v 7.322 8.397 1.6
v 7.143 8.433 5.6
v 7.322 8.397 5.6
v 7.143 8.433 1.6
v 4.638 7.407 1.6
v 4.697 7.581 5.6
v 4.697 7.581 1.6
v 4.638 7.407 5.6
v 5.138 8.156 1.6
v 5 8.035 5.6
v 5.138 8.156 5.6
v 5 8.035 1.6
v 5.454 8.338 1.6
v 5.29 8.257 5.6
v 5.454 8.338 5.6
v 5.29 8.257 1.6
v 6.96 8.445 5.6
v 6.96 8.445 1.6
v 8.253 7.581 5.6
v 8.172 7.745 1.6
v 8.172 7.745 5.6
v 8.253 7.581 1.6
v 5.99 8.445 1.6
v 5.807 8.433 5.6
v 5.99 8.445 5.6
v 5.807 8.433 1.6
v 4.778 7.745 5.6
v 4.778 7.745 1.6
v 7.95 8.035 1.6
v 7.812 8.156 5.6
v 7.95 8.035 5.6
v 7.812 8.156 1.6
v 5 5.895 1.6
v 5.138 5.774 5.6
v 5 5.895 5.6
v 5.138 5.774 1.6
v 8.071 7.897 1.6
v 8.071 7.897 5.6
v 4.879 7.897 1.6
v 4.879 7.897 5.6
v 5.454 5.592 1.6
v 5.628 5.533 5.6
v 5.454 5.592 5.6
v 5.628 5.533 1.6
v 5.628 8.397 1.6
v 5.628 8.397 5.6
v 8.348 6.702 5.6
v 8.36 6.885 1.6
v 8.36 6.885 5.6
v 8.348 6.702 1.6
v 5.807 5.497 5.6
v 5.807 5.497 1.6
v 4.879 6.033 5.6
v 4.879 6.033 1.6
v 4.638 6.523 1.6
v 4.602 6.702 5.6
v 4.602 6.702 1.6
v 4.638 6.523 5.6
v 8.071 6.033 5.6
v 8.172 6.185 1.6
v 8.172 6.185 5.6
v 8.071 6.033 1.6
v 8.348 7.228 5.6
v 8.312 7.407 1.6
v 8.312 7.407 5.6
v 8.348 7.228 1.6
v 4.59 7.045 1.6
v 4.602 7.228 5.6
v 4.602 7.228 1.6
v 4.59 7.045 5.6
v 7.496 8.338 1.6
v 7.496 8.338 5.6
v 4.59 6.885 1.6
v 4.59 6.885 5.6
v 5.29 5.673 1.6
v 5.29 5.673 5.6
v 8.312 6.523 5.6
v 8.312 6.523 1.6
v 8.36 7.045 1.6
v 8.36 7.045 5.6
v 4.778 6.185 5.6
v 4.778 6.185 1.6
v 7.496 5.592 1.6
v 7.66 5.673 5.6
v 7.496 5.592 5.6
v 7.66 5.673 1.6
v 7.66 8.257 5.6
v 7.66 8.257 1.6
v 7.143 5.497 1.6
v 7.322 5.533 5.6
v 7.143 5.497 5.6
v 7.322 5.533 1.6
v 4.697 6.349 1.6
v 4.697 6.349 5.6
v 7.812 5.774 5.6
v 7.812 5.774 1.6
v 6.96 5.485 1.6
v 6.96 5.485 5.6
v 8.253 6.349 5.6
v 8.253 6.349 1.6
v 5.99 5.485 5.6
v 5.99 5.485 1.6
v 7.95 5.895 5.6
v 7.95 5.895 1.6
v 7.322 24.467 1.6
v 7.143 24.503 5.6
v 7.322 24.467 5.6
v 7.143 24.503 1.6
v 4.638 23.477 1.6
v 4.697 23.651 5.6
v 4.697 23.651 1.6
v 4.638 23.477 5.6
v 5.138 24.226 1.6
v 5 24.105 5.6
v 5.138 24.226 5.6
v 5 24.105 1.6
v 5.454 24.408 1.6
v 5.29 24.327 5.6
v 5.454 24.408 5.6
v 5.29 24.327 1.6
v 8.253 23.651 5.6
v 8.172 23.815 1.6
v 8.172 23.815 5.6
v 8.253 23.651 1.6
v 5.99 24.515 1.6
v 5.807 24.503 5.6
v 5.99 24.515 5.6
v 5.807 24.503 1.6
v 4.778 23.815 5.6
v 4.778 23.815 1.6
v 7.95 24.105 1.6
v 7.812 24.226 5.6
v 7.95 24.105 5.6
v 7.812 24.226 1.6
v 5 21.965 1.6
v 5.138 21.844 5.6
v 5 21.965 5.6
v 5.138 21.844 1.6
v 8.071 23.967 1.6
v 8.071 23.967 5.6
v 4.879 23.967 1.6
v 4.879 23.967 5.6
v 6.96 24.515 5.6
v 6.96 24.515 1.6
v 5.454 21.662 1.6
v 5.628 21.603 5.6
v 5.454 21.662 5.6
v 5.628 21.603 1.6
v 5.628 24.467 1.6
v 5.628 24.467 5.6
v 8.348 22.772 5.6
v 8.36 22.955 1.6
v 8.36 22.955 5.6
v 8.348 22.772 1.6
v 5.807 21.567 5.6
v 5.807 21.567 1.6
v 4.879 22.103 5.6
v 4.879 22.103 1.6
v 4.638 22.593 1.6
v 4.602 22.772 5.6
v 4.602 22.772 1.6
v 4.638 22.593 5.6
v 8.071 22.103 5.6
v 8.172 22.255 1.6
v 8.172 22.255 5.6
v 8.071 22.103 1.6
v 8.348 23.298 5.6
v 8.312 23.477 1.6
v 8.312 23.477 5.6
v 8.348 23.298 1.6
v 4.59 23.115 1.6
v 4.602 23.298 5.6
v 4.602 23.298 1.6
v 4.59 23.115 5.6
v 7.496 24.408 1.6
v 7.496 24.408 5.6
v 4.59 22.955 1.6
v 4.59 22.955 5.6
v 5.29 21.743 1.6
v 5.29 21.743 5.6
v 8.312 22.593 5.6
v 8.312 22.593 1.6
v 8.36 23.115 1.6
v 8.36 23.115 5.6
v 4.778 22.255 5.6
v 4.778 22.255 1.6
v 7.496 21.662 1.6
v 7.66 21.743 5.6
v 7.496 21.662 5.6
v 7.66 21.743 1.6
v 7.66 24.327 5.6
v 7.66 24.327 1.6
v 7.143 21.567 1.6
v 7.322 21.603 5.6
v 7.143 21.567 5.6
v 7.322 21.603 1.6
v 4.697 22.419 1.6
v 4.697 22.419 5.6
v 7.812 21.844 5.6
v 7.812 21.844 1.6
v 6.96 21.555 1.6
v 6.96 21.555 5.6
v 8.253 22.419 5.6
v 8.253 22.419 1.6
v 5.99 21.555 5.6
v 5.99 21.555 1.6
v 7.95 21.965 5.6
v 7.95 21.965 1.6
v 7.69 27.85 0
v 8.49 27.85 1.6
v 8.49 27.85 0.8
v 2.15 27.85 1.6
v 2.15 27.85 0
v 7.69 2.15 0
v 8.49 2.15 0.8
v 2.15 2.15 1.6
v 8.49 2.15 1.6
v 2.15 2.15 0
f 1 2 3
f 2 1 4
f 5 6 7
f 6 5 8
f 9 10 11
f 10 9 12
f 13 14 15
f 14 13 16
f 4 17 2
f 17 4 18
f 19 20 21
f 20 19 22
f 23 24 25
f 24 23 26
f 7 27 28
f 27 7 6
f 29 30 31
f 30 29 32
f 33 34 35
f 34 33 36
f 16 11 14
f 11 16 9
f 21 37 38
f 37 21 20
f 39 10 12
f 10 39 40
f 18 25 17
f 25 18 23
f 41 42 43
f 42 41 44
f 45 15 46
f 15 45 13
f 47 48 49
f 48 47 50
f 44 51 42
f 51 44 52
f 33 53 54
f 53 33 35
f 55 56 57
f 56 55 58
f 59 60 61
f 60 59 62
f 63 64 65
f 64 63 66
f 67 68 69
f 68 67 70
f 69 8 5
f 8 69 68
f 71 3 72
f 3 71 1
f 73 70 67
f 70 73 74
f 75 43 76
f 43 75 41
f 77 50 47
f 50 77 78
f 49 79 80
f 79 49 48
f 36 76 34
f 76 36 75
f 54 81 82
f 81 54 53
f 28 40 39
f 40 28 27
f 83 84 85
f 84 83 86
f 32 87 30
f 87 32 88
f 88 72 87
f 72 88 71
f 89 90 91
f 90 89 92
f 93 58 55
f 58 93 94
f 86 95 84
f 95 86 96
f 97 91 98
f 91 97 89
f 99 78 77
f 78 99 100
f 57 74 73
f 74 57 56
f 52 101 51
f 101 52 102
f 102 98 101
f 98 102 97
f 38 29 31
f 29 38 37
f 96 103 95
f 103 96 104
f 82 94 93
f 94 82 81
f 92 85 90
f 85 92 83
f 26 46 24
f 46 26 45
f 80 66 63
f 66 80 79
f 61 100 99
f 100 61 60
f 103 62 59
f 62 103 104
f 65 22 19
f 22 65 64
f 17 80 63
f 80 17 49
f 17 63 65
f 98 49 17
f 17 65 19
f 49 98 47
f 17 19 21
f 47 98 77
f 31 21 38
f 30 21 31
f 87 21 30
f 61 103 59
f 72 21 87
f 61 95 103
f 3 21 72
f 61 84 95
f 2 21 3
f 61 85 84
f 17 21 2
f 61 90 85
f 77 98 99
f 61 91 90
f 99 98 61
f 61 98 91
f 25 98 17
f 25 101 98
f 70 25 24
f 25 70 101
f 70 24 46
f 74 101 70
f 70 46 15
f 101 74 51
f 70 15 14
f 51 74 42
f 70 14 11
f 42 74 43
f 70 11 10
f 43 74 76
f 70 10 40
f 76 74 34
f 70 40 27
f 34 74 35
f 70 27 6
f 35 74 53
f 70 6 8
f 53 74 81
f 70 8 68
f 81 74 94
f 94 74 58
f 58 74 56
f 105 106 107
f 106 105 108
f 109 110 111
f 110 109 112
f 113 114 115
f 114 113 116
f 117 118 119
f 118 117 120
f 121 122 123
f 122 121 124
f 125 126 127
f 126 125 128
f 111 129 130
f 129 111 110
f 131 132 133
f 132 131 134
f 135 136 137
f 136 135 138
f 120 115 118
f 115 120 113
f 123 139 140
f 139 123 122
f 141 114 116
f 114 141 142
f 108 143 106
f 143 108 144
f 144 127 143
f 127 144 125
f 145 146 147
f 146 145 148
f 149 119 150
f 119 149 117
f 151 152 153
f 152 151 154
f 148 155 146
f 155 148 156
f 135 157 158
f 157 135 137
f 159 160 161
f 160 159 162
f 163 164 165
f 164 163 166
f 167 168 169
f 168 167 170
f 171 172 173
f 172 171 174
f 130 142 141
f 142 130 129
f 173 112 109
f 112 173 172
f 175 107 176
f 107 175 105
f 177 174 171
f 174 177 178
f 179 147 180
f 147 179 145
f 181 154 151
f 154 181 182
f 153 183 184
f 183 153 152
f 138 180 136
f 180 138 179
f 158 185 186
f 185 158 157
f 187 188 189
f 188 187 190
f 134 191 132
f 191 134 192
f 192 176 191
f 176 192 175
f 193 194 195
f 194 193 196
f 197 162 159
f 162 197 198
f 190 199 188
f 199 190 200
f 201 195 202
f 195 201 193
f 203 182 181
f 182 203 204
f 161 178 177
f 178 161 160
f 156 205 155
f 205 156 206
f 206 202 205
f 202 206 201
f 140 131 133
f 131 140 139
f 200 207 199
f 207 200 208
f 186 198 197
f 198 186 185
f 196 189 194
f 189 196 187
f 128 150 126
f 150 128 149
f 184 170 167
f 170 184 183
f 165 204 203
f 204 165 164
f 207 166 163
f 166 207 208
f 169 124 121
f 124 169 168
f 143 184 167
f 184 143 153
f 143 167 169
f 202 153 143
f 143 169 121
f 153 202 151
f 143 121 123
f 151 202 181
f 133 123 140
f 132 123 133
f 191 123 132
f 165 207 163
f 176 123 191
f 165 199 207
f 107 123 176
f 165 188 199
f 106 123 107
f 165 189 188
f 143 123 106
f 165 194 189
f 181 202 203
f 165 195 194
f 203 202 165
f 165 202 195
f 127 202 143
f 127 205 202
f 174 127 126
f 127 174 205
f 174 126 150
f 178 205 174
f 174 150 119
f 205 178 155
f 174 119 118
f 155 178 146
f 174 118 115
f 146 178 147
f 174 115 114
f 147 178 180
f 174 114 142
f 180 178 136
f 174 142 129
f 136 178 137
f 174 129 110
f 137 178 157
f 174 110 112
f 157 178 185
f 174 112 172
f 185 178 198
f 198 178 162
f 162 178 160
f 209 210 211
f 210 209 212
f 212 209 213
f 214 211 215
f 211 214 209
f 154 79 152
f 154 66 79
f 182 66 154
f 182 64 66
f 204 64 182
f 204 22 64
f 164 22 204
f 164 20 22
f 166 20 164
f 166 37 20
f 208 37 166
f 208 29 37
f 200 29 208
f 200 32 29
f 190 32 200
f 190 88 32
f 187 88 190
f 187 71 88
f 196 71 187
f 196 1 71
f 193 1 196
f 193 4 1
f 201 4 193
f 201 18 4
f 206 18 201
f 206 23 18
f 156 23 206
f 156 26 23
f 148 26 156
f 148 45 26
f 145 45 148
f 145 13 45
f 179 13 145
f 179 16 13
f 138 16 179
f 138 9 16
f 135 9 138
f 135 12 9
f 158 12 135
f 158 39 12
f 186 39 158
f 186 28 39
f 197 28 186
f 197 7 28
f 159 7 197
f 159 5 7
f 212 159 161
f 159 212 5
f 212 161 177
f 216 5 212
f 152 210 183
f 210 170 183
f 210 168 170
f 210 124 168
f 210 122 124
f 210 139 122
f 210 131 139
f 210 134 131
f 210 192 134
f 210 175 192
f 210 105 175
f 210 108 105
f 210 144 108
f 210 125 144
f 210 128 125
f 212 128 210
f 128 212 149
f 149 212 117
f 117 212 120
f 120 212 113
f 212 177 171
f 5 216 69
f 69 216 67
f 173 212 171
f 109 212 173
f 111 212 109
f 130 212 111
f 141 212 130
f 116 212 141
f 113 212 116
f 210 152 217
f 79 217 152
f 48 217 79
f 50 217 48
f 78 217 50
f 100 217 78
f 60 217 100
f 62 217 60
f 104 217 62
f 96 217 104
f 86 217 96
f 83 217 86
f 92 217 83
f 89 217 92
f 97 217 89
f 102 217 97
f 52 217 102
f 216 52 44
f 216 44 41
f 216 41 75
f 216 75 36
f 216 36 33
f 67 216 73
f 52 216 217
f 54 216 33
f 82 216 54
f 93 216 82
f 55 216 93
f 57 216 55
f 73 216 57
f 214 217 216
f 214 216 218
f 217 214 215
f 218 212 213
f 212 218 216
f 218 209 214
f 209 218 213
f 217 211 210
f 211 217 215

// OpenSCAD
// buttons.scad - flex insert for the two front buttons, built step by step (same coordinates as build.scad)
// & "C:\Program Files\OpenSCAD\openscad.exe" -o ..\lilygo_buttons_test5.stl buttons.scad
$fn = 48;

// STEP 1: settings, copied from build.scad so the insert lines up with the shell
fit = 0.20;  rw = 2.0;  plug_over = 0.54;
pcb_w = 25.51;  blk_w = 25.6;  in_w = blk_w + 2*fit;   // inside width of the shell (26.0)
blk_y0 = (pcb_w - blk_w) / 2;
plate = 1.2;  blk_h = 6.44;  pcb_top = plate + blk_h + 0.1;   // z of the board's top surface
bx = rw + plug_over + fit;                       // shell x of the board's USB-C edge
by = rw + fit - blk_y0;                          // shell y of the board's edge
blk_x0 = 6.00;
step_x1 = blk_x0 - fit;  step_extra = 1.1;  step_wall = 1.0;  wall_cham = 0.8;
step_under = 3.5;  step_plate = 1.6;
wall_top = pcb_top - step_under;                 // top of the roof (4.24)
roof_bot = wall_top - step_plate;                // underside of the roof (2.64), the recess is open below this
recess_x1 = bx + step_x1 + step_extra - step_wall;   // where the recess ends at the drop-down wall's face
btn_x0 = 1.65;  btn_x1 = 5.82;                   // button x range on the board
btn_y0 = 3.04;  btn_y1 = 6.40;                   // button y range, from the board edge

// the insert's own settings
ins_gap = 0.15;                                  // free space between the insert and the recess walls, each side
top_gap = 0.10;                                  // free space between the insert's top and the roof underside
btn_top = 5.7;                                   // MEASURED: button top, up from the outer surface (bed) of the recess
btn_h   = pcb_top - btn_top;                    // so the button stands this far below the board's top surface (2.04)
btn_gap = 0.1;                                   // air gap between a stem's tip and its button (so nothing is pressed at rest)
stem_clr = 0.2;                                  // each stem is this much smaller than the button, each side

// STEP 2: the plate. It fills the recess from the bed (z = 0) up to just under the roof, clear of the walls by ins_gap.
ins_x0 = rw + ins_gap;
ins_x1 = recess_x1 - ins_gap;
ins_y0 = rw + ins_gap;
ins_y1 = rw + in_w - ins_gap;
ins_t  = 1.6;                                    // plate thickness (thinner so it flexes; outer face stays flush at z = 0)
echo("insert size x*y*z:", ins_x1 - ins_x0, ins_y1 - ins_y0, ins_t);

// STEP 3: bevel on the long edge next to the drop-down wall (matches wall_cham on the wall).
// The plate is a side profile (x and z) pushed along y: bevelled corner at the bed, on the wall side.
module plate() {
  L = ins_x1 - ins_x0;
  translate([ins_x0, ins_y1, 0])
    rotate([90, 0, 0])
      linear_extrude(height = ins_y1 - ins_y0)
        polygon([[0, 0], [L - wall_cham, 0], [L, wall_cham], [L, ins_t], [0, ins_t]]);
}
plate();


// rounded rectangle, same as in build.scad: a hull of four cylinders in the corners
stem_r = 1.4;                                   // corner radius of the stems (the finger holes use 1.0, the stems sit 0.25 inside them)
module rrect(l, w, h, r) {
  hull()
    for (x = [r, l - r], y = [r, w - r])
      translate([x, y, 0]) cylinder(r = r, h = h);
}

// STEP 4: a stem over each button. It rises from the plate through the finger hole and stops btn_gap short of the button.
stem_top = pcb_top - btn_h - btn_gap;            // z of the stem tip
for (m = [0, 1]) {
  yb = (m == 0) ? btn_y0 : pcb_w - btn_y1;
  sx0 = bx + btn_x0 + stem_clr;
  sx1 = min(bx + btn_x1 - stem_clr, ins_x1 - 0.03);    // stop at the plate's edge
  sy0 = by + yb + stem_clr;
  sy1 = by + yb + (btn_y1 - btn_y0) - stem_clr;
  translate([sx0, sy0, ins_t - 0.01])
    rrect(sx1 - sx0, sy1 - sy0, stem_top - ins_t + 0.01, stem_r);
}
echo("stem tip z:", stem_top, " stem length above plate:", stem_top - ins_t);
